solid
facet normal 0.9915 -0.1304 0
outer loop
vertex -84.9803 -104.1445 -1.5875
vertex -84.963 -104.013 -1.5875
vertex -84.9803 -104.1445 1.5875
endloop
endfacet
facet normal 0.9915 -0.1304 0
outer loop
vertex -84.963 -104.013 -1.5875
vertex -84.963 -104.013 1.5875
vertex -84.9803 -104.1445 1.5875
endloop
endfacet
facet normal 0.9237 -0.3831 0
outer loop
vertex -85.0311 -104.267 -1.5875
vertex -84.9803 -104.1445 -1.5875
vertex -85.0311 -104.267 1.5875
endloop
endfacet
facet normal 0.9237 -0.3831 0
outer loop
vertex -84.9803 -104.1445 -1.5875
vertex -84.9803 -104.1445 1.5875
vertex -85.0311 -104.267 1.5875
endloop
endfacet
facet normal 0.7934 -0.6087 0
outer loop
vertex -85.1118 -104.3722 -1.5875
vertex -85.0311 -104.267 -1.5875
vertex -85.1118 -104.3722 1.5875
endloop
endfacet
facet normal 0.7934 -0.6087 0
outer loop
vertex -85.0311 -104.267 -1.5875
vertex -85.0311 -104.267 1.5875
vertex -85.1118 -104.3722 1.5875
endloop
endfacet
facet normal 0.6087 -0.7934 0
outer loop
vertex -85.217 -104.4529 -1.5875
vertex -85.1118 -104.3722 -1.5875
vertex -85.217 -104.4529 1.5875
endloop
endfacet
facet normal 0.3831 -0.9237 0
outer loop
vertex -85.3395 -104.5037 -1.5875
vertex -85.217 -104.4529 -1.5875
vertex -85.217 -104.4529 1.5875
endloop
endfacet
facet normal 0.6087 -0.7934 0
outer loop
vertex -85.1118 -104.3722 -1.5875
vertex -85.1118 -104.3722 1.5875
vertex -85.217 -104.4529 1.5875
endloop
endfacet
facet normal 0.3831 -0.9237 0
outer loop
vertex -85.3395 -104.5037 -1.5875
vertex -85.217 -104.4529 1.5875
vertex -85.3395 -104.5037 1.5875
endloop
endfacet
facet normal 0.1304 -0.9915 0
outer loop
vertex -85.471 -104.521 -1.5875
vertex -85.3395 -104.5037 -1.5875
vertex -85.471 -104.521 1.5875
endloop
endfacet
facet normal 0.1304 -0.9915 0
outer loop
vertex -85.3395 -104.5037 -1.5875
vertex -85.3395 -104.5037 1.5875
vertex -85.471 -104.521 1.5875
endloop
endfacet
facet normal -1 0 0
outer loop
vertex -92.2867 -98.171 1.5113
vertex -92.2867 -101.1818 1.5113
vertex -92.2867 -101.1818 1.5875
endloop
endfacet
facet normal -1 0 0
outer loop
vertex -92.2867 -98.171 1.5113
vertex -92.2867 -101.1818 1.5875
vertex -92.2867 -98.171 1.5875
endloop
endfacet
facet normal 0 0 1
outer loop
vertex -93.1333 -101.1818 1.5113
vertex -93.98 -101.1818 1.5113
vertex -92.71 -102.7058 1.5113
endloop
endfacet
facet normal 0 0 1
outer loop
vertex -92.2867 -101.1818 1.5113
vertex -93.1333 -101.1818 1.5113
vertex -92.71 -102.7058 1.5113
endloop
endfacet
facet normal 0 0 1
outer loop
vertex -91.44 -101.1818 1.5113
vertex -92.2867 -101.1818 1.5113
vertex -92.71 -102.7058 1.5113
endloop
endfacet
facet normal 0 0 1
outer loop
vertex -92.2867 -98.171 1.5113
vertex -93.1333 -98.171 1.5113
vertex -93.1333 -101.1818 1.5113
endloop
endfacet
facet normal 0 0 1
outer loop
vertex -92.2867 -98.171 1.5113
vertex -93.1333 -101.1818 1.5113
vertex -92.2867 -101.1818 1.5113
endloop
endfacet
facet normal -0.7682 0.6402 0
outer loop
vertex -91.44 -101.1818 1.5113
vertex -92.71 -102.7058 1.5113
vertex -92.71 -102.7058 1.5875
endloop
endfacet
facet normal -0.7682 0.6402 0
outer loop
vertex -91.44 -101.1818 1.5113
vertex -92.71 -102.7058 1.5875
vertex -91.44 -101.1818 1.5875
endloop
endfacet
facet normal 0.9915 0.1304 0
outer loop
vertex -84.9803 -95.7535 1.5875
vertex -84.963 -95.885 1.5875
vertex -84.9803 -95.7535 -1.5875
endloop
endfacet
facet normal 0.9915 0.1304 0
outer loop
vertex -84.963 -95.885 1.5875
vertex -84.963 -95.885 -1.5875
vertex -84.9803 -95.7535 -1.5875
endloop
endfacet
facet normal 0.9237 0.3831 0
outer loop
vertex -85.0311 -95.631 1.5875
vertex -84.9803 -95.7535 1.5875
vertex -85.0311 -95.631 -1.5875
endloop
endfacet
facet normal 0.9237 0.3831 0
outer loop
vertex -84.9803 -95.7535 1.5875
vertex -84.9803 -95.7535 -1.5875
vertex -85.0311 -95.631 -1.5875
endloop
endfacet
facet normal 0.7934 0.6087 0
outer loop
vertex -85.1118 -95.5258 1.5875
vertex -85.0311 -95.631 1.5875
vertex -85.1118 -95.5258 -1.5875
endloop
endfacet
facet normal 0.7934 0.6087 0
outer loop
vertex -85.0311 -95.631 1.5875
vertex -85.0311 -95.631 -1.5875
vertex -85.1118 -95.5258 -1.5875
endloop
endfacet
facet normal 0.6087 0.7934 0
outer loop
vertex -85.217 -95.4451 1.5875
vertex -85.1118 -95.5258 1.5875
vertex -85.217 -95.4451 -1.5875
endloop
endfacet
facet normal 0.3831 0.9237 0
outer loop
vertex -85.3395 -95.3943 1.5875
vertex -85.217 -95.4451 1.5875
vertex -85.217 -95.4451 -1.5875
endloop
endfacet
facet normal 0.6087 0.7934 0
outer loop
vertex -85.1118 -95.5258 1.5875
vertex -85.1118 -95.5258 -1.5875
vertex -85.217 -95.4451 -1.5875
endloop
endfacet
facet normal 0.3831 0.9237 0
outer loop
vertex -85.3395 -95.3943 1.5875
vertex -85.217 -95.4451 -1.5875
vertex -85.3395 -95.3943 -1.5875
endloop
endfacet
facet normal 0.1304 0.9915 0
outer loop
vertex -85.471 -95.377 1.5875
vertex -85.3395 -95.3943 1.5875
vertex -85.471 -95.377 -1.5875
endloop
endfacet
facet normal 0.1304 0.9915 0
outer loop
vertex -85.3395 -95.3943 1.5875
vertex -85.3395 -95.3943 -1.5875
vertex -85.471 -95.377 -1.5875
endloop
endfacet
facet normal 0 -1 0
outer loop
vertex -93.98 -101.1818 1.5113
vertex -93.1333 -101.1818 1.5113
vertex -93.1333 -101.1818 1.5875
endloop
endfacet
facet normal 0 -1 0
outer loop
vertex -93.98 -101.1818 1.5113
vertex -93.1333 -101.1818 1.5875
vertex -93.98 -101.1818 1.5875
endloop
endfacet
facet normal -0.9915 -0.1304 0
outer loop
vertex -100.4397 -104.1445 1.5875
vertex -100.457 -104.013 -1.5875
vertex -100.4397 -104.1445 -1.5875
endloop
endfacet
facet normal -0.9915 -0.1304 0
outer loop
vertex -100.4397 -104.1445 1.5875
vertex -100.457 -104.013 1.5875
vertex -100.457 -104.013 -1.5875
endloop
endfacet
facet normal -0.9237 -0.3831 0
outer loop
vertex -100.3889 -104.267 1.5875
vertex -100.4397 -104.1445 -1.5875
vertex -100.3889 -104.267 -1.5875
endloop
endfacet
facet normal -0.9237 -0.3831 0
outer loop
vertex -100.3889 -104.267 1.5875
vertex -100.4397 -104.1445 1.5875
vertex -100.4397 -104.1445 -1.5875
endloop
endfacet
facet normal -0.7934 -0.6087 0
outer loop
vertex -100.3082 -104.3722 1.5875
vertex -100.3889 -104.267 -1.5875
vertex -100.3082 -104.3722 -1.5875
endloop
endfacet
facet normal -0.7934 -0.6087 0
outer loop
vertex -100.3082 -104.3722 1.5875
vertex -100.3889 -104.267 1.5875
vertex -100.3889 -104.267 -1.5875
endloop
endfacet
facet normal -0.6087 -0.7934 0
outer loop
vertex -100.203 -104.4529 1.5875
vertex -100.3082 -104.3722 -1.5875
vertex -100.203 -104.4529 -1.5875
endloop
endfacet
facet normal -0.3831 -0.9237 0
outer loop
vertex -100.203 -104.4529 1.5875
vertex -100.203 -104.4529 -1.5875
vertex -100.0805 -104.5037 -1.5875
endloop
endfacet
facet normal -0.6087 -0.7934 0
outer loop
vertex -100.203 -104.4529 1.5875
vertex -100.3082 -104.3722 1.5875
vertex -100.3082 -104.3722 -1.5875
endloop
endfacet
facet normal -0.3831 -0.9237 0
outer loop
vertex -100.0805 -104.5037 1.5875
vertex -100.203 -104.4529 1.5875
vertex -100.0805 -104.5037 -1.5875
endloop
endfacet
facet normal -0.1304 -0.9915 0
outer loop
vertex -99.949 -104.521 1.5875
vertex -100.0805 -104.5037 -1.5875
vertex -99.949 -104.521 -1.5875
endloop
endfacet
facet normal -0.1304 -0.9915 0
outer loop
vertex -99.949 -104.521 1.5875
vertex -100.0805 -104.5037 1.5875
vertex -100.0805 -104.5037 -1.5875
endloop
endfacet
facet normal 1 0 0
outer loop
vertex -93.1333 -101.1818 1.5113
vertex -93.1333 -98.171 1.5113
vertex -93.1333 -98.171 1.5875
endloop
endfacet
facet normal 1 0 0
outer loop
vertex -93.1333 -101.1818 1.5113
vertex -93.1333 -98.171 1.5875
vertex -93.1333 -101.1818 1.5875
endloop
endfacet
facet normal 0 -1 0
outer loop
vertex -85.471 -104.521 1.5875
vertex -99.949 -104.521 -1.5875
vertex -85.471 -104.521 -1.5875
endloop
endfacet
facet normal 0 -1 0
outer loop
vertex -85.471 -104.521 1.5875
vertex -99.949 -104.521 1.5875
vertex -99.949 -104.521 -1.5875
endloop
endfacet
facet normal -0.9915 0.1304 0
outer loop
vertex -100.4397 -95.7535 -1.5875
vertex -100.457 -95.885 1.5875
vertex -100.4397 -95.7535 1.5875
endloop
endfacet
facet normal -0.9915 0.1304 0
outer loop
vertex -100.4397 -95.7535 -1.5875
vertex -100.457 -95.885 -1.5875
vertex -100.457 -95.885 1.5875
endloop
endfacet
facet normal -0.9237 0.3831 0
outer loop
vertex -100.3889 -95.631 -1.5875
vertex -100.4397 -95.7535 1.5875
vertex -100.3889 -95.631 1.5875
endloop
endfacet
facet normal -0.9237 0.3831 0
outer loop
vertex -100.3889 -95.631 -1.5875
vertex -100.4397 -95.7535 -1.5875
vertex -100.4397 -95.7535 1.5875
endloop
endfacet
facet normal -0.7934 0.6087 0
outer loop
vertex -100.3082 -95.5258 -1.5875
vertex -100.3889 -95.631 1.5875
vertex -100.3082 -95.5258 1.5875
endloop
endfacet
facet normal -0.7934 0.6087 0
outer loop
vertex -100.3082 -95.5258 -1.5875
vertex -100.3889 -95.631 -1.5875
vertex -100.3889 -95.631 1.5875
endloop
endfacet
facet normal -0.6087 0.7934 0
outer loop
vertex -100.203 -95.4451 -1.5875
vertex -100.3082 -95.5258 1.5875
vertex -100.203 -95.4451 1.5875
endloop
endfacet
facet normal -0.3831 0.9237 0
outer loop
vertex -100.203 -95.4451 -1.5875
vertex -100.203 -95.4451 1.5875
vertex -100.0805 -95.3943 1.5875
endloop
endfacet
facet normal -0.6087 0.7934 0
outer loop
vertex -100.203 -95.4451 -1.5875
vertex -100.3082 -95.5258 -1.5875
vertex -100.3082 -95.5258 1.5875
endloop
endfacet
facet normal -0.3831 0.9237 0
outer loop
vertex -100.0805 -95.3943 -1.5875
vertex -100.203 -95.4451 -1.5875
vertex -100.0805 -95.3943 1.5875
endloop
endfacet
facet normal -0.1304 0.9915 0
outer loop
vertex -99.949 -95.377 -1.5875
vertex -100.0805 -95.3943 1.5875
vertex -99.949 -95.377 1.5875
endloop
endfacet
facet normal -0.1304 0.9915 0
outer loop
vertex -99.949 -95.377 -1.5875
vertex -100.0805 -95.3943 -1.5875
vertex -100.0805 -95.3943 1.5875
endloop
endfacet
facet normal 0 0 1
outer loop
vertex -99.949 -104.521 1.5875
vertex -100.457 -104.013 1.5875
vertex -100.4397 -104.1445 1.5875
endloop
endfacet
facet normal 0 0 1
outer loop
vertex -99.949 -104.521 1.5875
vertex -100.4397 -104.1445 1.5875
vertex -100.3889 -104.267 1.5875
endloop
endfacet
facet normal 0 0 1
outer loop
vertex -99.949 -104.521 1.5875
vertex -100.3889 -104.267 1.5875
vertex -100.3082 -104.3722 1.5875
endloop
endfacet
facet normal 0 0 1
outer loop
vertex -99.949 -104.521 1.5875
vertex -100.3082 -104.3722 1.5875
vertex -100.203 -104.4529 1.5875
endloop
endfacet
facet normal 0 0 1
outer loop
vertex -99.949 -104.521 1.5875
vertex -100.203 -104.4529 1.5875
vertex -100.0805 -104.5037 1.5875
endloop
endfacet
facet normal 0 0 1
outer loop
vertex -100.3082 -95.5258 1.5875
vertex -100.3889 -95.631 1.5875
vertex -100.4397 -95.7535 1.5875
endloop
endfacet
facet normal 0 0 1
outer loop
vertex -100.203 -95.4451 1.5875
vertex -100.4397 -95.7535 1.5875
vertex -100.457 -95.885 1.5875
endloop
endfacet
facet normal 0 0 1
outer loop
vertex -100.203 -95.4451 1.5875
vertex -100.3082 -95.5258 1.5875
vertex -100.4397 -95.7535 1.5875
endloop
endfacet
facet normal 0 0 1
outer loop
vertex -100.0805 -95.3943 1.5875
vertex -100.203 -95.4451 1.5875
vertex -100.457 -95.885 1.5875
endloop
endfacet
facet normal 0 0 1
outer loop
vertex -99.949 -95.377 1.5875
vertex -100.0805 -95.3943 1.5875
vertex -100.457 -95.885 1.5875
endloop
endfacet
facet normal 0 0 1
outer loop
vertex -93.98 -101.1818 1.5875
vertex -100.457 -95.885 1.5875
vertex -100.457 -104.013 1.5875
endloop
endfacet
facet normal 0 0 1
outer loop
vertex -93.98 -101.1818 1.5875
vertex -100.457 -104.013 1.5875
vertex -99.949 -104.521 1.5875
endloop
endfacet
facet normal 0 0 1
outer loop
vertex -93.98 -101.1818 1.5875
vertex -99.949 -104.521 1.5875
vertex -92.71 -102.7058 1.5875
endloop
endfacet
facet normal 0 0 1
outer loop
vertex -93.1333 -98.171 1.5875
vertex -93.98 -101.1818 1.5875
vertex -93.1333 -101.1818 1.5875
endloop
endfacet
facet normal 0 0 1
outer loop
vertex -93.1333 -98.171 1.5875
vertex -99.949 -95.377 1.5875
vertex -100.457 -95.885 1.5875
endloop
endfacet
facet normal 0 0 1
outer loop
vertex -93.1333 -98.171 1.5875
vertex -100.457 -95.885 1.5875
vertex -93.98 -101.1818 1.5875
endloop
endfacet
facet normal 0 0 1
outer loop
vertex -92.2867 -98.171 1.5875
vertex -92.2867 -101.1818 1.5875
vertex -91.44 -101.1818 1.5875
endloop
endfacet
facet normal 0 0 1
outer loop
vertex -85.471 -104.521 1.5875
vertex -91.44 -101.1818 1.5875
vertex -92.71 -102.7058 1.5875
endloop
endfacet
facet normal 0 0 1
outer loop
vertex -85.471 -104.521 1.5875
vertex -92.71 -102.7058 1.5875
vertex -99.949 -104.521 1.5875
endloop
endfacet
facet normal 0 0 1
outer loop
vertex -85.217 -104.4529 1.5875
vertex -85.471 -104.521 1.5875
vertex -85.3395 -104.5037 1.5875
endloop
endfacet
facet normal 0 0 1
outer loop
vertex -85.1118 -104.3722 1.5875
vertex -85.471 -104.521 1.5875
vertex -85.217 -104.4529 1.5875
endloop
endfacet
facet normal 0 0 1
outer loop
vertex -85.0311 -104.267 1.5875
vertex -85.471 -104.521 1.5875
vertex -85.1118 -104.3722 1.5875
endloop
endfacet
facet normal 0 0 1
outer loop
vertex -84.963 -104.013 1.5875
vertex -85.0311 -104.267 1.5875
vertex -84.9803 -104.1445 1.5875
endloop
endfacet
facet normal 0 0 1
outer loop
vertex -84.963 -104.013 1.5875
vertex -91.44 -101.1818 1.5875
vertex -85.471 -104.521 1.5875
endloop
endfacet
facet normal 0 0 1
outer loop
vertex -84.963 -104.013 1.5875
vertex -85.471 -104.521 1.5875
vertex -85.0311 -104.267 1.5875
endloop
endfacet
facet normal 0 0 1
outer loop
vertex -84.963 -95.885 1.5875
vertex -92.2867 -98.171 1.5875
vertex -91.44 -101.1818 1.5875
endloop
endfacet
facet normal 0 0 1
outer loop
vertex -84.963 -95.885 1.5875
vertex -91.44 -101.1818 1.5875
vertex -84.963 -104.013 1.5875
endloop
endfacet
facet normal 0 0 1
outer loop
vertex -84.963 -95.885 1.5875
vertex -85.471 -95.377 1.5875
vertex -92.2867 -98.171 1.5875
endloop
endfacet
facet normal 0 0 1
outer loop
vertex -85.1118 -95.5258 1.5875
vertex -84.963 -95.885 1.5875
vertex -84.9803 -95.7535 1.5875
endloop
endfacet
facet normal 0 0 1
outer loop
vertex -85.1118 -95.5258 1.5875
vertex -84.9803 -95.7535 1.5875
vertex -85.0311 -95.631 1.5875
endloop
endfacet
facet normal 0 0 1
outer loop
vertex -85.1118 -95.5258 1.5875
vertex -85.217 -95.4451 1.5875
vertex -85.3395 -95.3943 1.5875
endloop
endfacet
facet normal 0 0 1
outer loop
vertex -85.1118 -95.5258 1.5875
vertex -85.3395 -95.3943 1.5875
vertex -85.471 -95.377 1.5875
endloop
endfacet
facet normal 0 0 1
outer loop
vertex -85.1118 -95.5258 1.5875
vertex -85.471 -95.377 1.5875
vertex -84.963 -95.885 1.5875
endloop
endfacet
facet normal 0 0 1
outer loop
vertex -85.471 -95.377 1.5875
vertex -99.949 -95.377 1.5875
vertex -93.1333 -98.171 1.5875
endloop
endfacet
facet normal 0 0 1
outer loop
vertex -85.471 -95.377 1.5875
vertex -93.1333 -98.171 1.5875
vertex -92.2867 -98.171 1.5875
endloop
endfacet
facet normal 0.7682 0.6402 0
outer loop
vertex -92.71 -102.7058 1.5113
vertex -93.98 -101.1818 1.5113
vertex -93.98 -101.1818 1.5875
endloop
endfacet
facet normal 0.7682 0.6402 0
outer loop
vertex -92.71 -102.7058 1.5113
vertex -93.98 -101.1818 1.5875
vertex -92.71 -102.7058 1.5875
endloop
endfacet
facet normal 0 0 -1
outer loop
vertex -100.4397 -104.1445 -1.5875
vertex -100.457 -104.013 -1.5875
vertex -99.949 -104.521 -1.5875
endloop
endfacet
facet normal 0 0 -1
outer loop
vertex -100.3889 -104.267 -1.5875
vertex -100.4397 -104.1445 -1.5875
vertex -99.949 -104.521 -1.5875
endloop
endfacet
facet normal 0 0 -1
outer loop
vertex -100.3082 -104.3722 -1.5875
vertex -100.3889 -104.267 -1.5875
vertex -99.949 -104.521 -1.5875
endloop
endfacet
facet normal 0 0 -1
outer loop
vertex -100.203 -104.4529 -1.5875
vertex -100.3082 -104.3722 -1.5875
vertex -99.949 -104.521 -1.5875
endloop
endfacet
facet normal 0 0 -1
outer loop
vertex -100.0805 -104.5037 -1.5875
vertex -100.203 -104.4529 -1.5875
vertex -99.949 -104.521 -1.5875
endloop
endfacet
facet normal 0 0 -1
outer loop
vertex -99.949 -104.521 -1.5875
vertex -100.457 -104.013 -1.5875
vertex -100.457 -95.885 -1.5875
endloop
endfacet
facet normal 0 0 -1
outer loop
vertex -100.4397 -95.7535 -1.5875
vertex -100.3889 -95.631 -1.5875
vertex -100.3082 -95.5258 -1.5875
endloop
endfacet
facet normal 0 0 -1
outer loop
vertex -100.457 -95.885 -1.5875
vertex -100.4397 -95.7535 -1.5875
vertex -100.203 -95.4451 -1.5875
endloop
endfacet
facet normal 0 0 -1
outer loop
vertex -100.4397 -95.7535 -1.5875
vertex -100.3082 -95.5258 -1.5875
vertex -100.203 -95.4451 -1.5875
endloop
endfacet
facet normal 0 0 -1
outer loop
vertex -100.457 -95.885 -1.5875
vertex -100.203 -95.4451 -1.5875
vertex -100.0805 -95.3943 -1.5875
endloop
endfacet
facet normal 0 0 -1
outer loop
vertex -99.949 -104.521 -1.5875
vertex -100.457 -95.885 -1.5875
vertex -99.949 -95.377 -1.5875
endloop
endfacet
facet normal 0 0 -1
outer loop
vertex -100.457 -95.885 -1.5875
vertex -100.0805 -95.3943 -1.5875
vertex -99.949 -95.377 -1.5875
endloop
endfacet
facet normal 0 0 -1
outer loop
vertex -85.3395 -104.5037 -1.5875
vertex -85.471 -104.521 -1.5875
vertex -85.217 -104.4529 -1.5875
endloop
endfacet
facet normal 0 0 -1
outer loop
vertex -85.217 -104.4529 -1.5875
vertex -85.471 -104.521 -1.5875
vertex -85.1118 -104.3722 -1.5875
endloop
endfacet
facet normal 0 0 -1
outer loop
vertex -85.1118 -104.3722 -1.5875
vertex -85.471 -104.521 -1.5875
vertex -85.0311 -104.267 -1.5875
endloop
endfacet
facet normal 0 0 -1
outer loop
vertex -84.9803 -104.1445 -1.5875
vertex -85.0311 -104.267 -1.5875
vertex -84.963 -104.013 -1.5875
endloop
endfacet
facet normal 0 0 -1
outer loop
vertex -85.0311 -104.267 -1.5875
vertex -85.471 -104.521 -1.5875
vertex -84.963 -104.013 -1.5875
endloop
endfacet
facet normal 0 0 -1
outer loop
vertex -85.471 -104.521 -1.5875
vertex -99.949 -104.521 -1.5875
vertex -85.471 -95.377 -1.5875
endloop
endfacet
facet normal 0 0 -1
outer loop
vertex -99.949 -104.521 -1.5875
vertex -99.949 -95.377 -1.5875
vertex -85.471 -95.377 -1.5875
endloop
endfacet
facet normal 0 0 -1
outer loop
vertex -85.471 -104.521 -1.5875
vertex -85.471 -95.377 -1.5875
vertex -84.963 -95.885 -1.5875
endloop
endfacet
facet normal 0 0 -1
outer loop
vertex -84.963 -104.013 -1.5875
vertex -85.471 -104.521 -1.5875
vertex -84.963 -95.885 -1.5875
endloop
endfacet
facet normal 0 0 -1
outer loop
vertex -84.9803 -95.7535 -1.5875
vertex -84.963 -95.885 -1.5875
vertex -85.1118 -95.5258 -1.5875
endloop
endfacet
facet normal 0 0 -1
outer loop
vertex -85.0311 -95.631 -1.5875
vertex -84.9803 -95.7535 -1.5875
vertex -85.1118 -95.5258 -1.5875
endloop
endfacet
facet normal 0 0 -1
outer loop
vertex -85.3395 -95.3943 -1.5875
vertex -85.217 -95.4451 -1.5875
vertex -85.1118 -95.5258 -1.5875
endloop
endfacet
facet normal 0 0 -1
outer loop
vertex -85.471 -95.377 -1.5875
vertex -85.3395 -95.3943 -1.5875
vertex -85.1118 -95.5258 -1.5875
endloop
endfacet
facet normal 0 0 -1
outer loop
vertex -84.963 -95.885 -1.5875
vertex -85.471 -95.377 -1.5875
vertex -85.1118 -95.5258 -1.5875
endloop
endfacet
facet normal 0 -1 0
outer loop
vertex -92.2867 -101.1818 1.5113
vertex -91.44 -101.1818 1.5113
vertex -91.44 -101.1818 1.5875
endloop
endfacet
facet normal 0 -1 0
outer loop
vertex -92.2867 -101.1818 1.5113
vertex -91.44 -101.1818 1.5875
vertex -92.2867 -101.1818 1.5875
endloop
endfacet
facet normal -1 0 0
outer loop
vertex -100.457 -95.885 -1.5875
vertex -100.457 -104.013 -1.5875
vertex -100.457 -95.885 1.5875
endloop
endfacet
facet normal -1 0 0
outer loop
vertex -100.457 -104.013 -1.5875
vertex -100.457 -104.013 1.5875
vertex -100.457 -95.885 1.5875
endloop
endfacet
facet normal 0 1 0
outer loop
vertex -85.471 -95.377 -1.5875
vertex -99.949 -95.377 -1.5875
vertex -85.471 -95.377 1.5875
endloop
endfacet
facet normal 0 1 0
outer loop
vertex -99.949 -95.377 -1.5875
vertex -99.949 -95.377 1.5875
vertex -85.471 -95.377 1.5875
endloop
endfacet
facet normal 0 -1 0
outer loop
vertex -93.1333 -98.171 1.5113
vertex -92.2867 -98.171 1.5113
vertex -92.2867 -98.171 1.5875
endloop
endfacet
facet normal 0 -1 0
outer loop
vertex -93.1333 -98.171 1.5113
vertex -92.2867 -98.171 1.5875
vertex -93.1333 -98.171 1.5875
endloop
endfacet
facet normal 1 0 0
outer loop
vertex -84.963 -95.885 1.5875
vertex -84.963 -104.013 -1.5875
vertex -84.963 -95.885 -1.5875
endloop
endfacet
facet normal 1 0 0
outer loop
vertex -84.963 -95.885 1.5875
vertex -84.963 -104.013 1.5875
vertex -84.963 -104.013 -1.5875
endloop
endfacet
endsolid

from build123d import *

# Parameters (mm, degrees)
SKETCH1_W           = 15.494
SKETCH1_H           = 9.144
BOSS_EXTRUDE1_DEPTH = 1.5875
FILLET1_R           = 0.508
WRAP2_START         = -0.0762
WRAP2_DEPTH         = 0.0762


# Read off the part's stored shape, not the designer's step: Wrap2
with BuildPart() as part:
    # Sketch1 → Boss-Extrude1 (new, symmetric)
    with BuildSketch(Plane.XY):
        with Locations((-92.71, -99.949)):
            Rectangle(SKETCH1_W, SKETCH1_H)
    extrude(amount=BOSS_EXTRUDE1_DEPTH, both=True)

    # Fillet1
    fillet1_edges = [part.edges().sort_by_distance(p)[0] for p in [
        (-84.963, -104.521, 0),
        (-100.457, -104.521, 0),
        (-100.457, -95.377, 0),
        (-84.963, -95.377, 0),
    ]]
    fillet(fillet1_edges, radius=FILLET1_R)

    # Wrap2 outline → Wrap2 (cut)
    with BuildSketch(Plane.XY.offset(1.5875).offset(WRAP2_START)):
        Polygon((-92.286666667, -98.171), (-93.133333333, -98.171), (-93.133333333, -101.181834934), (-93.98, -101.181834934), (-92.71, -102.705834934), (-91.44, -101.181834934), (-92.286666667, -101.181834934), align=None)
    extrude(amount=WRAP2_DEPTH, mode=Mode.SUBTRACT)


solid = part.part
